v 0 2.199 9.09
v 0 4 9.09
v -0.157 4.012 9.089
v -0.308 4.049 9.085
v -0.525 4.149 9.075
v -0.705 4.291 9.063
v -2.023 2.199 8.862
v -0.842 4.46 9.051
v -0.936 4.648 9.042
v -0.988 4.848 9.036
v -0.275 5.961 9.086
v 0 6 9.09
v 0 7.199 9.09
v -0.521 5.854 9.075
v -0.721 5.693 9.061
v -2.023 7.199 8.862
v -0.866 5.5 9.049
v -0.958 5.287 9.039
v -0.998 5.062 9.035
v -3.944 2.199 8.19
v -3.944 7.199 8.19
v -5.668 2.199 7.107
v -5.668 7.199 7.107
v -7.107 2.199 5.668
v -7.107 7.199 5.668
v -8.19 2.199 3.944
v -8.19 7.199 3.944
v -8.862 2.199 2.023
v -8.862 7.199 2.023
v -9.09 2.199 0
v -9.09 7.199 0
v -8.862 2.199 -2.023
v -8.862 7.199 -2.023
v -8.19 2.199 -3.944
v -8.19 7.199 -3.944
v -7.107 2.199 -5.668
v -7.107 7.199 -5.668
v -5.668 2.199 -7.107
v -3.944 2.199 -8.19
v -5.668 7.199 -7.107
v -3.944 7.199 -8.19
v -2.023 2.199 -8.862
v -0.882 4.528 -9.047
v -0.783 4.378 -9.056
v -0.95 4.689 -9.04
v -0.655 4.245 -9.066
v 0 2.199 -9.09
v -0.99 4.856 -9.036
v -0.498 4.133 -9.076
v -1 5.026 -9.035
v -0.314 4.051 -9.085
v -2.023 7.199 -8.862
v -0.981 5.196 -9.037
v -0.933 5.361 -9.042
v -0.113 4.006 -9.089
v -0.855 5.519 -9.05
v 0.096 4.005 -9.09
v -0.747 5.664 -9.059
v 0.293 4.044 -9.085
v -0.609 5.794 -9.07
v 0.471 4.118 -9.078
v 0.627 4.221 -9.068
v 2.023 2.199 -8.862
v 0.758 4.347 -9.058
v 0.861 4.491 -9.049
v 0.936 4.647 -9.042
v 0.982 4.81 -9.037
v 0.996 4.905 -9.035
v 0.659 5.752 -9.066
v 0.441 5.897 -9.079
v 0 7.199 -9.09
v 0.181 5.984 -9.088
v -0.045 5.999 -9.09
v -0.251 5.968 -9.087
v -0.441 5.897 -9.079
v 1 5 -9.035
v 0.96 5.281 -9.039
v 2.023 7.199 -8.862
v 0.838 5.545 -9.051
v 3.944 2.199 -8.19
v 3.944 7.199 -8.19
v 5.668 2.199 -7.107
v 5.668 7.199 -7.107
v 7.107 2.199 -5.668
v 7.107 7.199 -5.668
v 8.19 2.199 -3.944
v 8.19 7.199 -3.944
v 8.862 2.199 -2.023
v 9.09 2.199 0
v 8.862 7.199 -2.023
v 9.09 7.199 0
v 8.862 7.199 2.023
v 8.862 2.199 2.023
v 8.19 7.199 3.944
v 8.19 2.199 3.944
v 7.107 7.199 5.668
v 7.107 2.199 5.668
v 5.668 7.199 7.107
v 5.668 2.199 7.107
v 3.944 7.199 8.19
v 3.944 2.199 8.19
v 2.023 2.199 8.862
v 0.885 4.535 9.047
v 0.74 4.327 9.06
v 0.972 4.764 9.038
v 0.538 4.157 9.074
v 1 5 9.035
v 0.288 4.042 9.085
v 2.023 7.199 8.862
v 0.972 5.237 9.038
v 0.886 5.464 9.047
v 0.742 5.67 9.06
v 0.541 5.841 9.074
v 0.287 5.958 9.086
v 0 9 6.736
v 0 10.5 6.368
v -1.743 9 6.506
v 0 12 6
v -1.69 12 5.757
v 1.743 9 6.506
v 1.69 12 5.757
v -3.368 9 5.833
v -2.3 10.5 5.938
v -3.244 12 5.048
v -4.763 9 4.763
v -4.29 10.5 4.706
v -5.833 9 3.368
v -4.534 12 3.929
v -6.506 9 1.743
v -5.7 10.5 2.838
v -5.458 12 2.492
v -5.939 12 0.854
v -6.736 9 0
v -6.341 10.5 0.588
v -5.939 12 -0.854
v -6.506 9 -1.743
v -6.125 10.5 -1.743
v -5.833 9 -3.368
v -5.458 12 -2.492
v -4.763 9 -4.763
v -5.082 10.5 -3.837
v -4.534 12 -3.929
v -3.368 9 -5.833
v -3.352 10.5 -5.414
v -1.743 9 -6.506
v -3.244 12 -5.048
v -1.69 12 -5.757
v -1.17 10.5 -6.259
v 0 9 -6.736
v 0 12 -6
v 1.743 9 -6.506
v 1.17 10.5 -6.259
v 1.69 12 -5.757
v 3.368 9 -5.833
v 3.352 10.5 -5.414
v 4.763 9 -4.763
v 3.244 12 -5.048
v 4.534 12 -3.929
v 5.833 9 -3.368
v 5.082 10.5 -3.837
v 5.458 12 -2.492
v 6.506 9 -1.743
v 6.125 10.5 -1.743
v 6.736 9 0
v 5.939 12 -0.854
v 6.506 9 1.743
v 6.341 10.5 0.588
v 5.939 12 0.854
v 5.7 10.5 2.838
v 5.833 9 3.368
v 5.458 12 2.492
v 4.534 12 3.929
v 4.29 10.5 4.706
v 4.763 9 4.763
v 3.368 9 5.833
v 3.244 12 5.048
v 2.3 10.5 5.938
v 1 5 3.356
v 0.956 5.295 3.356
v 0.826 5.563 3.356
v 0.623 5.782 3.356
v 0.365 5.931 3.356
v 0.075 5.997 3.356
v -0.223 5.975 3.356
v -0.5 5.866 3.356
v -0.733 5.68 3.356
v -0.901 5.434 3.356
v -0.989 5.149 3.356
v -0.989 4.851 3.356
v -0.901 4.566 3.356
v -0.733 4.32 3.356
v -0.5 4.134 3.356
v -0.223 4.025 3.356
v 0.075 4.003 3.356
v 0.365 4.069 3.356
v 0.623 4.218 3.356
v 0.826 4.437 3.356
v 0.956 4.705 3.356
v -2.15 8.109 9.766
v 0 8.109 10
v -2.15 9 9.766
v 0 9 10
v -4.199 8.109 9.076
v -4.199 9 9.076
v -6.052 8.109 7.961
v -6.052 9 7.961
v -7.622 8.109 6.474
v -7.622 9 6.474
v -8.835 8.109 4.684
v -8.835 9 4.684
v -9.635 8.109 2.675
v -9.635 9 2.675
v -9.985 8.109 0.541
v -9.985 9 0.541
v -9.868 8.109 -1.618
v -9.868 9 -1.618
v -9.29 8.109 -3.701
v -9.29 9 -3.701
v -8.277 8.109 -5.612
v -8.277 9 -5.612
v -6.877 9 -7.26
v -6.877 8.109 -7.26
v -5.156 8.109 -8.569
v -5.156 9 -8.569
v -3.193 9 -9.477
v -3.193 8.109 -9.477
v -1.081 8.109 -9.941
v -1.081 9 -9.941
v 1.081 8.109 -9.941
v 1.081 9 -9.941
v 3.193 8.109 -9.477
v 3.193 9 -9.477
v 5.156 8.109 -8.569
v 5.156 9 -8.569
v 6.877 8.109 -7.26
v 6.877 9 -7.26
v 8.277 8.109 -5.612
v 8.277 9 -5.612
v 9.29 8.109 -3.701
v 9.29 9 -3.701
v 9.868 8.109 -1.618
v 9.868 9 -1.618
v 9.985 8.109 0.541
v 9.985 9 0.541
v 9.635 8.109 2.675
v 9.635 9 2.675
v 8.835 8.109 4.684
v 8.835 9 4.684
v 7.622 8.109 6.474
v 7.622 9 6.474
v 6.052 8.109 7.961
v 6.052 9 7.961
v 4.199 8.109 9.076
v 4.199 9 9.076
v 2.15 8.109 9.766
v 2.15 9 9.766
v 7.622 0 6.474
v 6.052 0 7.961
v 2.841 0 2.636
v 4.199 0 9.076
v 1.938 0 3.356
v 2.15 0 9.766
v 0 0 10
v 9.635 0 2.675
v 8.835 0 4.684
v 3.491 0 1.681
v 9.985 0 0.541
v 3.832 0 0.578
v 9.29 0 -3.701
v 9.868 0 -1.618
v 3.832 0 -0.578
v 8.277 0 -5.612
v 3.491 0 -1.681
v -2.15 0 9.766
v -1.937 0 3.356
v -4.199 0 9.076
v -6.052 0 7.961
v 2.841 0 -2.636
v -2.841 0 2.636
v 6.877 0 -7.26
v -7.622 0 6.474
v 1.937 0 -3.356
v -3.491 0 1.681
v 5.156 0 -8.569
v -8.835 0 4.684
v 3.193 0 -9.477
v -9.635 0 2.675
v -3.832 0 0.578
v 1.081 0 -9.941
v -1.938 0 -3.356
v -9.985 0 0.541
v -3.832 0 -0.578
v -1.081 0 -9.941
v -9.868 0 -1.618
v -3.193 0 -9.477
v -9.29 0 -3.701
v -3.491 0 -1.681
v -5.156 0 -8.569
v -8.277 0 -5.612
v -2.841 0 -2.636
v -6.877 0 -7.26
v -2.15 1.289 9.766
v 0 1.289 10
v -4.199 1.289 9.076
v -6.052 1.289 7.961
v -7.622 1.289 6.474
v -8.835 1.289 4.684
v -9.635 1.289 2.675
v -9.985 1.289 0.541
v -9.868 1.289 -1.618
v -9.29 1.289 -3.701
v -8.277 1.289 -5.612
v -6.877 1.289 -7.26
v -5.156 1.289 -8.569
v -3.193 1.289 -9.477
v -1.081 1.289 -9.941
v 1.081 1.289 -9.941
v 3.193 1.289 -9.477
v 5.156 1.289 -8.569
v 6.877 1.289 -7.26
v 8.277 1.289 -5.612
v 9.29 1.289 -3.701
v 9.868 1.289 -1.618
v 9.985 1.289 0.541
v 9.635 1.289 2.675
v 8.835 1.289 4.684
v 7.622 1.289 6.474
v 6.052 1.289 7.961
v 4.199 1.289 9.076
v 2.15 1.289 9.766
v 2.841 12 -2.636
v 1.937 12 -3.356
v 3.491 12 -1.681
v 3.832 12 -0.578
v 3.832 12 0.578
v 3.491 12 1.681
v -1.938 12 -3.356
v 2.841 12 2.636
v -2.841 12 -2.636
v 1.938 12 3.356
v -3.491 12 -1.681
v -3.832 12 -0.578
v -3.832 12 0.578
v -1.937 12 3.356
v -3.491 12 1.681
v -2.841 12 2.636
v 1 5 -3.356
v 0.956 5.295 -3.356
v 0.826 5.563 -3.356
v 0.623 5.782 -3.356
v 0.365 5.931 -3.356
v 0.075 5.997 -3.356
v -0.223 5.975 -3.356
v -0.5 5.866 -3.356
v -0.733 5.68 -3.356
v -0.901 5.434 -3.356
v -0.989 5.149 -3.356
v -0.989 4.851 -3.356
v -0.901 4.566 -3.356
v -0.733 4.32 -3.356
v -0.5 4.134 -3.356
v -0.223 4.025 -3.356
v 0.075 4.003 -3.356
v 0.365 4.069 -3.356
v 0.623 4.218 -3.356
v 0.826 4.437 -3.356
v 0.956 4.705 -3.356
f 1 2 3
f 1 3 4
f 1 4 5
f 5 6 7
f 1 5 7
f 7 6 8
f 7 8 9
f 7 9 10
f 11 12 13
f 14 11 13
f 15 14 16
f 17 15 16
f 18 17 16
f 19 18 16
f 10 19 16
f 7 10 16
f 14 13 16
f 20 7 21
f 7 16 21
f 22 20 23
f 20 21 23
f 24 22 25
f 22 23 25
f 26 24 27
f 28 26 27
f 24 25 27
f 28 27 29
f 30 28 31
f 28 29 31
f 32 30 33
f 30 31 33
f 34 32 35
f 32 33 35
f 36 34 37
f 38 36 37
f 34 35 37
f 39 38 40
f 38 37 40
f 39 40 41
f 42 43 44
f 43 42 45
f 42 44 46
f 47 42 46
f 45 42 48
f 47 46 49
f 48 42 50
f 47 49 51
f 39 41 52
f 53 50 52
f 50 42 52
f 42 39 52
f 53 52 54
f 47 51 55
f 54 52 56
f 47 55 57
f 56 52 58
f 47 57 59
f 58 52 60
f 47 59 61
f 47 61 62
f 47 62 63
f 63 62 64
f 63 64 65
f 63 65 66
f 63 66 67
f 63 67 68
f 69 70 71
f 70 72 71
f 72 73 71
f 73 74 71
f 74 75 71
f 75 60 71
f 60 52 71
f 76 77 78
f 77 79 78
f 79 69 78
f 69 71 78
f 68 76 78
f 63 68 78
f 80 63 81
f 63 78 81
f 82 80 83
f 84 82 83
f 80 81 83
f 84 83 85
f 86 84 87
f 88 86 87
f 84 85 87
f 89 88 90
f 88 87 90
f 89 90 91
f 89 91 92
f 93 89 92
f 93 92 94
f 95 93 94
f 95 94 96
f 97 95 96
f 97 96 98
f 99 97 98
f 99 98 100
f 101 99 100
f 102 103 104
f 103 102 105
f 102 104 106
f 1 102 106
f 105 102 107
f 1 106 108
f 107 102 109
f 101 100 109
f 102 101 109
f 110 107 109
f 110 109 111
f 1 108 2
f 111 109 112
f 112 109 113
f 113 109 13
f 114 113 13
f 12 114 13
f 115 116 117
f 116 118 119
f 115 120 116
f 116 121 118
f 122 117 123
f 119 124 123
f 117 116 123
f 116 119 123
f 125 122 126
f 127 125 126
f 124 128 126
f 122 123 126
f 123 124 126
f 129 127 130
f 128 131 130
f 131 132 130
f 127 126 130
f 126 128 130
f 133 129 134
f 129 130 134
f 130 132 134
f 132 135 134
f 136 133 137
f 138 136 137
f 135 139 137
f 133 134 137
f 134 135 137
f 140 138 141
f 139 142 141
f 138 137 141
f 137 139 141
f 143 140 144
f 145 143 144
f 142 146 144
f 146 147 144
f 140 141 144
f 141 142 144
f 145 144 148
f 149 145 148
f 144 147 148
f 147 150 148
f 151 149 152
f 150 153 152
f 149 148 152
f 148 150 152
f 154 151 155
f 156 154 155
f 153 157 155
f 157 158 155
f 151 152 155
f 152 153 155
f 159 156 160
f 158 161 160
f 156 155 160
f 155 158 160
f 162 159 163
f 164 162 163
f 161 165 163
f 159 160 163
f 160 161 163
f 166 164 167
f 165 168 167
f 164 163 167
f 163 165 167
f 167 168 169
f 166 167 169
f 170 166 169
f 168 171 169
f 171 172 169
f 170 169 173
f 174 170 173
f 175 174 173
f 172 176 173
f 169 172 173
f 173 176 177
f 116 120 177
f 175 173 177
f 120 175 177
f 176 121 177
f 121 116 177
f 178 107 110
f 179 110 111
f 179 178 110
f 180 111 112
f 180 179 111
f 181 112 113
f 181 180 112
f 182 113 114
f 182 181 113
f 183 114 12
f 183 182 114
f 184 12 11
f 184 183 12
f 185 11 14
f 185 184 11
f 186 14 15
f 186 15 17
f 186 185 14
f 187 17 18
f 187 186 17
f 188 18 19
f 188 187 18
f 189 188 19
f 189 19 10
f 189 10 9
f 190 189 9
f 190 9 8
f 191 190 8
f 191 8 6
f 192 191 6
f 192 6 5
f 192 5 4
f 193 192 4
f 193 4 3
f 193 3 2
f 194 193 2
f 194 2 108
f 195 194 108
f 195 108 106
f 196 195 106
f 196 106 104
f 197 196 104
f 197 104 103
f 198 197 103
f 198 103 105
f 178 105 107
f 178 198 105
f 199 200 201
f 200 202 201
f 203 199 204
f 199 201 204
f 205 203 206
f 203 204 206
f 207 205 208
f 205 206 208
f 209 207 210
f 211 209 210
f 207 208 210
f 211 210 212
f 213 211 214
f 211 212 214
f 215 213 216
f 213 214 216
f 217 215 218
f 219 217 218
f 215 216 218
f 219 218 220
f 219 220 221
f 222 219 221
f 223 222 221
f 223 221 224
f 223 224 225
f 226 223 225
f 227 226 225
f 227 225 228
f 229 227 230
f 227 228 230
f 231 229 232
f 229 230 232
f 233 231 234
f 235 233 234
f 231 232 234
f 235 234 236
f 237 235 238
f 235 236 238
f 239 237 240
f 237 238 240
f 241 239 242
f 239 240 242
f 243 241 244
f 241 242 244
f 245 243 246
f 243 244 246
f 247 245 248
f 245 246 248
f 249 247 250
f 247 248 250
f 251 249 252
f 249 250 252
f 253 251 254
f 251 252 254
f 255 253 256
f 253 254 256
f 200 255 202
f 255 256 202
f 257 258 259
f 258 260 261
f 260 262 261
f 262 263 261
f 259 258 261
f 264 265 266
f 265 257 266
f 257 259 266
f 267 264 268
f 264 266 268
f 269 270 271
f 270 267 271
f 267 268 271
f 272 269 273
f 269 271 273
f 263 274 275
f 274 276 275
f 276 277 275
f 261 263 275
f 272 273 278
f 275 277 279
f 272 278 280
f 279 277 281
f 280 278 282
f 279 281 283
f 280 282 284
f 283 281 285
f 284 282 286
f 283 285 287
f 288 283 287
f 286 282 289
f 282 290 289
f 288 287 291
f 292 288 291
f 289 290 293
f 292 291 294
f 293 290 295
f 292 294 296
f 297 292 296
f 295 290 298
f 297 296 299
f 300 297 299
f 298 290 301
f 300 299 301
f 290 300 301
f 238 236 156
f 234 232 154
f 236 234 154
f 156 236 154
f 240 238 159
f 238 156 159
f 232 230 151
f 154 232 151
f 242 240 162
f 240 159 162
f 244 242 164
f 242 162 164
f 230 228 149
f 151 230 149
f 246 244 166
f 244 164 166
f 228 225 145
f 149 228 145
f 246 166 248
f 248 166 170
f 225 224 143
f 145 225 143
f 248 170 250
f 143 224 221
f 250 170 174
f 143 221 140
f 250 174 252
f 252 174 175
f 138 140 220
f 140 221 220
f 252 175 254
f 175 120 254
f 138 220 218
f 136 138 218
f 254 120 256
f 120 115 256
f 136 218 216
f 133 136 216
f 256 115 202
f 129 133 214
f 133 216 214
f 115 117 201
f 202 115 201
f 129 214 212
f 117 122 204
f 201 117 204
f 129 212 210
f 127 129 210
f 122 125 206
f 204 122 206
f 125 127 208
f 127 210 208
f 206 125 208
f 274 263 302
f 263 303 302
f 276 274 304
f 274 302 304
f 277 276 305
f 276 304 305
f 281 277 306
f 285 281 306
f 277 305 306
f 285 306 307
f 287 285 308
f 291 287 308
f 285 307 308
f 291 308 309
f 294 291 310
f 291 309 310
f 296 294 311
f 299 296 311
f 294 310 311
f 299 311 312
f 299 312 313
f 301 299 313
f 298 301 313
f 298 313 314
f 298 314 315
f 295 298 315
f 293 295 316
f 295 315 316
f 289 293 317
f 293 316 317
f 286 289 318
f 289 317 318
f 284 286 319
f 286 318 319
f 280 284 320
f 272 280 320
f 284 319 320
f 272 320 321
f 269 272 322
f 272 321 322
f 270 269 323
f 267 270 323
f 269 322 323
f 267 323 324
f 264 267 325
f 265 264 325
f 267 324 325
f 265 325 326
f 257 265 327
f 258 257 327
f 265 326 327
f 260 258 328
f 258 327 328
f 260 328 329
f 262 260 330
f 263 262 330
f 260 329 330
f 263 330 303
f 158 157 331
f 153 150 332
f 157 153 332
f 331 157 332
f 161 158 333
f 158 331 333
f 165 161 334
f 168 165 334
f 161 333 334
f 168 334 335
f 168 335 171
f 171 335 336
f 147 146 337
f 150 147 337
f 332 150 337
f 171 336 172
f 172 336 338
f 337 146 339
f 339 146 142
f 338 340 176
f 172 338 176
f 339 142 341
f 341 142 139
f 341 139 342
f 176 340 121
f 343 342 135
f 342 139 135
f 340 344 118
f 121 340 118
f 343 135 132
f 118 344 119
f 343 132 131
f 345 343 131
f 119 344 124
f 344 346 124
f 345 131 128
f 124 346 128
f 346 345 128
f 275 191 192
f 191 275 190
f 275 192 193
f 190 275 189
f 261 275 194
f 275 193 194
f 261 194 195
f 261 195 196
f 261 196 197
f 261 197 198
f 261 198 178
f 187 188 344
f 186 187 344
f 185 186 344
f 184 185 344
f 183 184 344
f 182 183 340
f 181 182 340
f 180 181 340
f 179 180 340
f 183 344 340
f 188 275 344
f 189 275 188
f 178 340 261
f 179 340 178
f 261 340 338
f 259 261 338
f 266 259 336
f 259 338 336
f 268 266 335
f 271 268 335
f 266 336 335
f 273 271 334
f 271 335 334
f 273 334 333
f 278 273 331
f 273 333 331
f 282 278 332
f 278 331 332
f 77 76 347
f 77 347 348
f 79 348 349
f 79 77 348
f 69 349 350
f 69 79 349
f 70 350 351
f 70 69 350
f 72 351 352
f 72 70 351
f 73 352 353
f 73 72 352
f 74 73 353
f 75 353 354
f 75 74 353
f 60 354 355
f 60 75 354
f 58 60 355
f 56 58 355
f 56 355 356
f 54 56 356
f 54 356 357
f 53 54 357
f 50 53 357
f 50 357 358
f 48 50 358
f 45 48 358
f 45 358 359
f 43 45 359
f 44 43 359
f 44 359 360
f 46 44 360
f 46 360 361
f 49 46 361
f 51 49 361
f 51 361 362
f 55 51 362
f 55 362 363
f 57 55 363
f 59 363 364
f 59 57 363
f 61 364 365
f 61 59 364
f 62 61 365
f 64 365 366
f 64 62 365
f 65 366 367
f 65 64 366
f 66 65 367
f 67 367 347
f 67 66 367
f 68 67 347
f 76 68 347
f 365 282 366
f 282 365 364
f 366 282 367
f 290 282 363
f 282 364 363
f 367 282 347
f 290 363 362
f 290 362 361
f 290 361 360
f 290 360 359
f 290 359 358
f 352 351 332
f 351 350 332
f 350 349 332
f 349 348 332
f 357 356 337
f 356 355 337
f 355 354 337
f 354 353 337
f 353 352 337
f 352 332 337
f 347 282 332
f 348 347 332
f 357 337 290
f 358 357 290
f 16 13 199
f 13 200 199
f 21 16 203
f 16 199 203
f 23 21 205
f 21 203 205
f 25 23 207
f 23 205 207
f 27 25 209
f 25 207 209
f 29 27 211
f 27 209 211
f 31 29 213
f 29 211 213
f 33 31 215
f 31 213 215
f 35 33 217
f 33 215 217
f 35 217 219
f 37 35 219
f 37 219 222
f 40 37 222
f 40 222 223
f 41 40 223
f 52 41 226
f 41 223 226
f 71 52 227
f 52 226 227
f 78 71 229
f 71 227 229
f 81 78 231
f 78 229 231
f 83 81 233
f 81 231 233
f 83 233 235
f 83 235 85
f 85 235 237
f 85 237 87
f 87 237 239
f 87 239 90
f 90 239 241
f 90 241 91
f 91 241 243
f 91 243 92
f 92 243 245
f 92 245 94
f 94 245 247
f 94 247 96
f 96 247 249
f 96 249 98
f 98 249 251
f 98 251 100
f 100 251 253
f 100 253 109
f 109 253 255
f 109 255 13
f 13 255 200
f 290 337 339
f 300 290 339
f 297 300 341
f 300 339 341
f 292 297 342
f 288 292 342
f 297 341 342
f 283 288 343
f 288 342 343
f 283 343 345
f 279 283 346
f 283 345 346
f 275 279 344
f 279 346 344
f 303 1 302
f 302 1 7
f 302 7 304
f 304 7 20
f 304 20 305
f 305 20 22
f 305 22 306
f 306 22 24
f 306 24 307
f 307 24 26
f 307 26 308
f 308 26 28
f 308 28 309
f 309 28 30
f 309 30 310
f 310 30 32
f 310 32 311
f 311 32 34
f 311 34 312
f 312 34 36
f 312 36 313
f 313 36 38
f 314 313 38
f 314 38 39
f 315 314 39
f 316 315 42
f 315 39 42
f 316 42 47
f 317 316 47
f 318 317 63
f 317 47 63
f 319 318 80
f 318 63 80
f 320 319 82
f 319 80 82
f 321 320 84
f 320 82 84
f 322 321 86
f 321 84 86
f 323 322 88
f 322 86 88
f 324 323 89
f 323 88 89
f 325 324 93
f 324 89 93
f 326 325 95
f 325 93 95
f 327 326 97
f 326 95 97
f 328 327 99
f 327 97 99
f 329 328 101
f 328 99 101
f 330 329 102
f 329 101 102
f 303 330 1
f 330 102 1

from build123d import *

# Parameters (mm, degrees)
CUT_EXTRUDE1_DEPTH      = 21
CUT_EXTRUDE2_DEPTH      = 19.547236991
CUT_EXTRUDE2_DEPTH_BACK = 19.547236991
SKETCH6_R               = 1


with BuildPart() as part:
    # Sketch4 → Revolve1 (revolve)
    with BuildSketch(Plane.XY, mode=Mode.PRIVATE) as revolve1_sk:
        Polygon((0, 0), (10, 0), (10, 1.289403445), (9.090035529, 2.199367917), (9.090035529, 7.199367917), (10, 8.109332388), (10, 9), (6.735647112, 9), (6, 12), (0, 12), (0, 9), align=None)
    revolve(revolve1_sk.sketch.rotate(Axis((0, 9, 0), (0, -1, 0)), 90), axis=Axis((0, 9, 0), (0, -1, 0)))

    # Sketch5 → Cut-Extrude1 (cut)
    with BuildSketch(Plane(origin=(0, 12, 0), x_dir=(1, 0, 0), z_dir=(0, 1, 0))):
        with BuildLine():
            Line((1.9375, 3.35584844), (-1.9375, 3.35584844))
            ThreePointArc((-1.9375, 3.35584844), (-3.875, 0), (-1.9375, -3.35584844))
            Line((-1.9375, -3.35584844), (1.9375, -3.35584844))
            ThreePointArc((1.9375, -3.35584844), (3.875, 0), (1.9375, 3.35584844))
        make_face()
    extrude(amount=-CUT_EXTRUDE1_DEPTH, mode=Mode.SUBTRACT)

    # Sketch6 → Cut-Extrude2 (cut, two sides: drawn at the far end of the back side and taken through both)
    with BuildSketch(Plane.XY.offset(-CUT_EXTRUDE2_DEPTH_BACK)):
        with Locations((0, 5)):
            Circle(SKETCH6_R)
    extrude(amount=CUT_EXTRUDE2_DEPTH + CUT_EXTRUDE2_DEPTH_BACK, mode=Mode.SUBTRACT)


solid = part.part
